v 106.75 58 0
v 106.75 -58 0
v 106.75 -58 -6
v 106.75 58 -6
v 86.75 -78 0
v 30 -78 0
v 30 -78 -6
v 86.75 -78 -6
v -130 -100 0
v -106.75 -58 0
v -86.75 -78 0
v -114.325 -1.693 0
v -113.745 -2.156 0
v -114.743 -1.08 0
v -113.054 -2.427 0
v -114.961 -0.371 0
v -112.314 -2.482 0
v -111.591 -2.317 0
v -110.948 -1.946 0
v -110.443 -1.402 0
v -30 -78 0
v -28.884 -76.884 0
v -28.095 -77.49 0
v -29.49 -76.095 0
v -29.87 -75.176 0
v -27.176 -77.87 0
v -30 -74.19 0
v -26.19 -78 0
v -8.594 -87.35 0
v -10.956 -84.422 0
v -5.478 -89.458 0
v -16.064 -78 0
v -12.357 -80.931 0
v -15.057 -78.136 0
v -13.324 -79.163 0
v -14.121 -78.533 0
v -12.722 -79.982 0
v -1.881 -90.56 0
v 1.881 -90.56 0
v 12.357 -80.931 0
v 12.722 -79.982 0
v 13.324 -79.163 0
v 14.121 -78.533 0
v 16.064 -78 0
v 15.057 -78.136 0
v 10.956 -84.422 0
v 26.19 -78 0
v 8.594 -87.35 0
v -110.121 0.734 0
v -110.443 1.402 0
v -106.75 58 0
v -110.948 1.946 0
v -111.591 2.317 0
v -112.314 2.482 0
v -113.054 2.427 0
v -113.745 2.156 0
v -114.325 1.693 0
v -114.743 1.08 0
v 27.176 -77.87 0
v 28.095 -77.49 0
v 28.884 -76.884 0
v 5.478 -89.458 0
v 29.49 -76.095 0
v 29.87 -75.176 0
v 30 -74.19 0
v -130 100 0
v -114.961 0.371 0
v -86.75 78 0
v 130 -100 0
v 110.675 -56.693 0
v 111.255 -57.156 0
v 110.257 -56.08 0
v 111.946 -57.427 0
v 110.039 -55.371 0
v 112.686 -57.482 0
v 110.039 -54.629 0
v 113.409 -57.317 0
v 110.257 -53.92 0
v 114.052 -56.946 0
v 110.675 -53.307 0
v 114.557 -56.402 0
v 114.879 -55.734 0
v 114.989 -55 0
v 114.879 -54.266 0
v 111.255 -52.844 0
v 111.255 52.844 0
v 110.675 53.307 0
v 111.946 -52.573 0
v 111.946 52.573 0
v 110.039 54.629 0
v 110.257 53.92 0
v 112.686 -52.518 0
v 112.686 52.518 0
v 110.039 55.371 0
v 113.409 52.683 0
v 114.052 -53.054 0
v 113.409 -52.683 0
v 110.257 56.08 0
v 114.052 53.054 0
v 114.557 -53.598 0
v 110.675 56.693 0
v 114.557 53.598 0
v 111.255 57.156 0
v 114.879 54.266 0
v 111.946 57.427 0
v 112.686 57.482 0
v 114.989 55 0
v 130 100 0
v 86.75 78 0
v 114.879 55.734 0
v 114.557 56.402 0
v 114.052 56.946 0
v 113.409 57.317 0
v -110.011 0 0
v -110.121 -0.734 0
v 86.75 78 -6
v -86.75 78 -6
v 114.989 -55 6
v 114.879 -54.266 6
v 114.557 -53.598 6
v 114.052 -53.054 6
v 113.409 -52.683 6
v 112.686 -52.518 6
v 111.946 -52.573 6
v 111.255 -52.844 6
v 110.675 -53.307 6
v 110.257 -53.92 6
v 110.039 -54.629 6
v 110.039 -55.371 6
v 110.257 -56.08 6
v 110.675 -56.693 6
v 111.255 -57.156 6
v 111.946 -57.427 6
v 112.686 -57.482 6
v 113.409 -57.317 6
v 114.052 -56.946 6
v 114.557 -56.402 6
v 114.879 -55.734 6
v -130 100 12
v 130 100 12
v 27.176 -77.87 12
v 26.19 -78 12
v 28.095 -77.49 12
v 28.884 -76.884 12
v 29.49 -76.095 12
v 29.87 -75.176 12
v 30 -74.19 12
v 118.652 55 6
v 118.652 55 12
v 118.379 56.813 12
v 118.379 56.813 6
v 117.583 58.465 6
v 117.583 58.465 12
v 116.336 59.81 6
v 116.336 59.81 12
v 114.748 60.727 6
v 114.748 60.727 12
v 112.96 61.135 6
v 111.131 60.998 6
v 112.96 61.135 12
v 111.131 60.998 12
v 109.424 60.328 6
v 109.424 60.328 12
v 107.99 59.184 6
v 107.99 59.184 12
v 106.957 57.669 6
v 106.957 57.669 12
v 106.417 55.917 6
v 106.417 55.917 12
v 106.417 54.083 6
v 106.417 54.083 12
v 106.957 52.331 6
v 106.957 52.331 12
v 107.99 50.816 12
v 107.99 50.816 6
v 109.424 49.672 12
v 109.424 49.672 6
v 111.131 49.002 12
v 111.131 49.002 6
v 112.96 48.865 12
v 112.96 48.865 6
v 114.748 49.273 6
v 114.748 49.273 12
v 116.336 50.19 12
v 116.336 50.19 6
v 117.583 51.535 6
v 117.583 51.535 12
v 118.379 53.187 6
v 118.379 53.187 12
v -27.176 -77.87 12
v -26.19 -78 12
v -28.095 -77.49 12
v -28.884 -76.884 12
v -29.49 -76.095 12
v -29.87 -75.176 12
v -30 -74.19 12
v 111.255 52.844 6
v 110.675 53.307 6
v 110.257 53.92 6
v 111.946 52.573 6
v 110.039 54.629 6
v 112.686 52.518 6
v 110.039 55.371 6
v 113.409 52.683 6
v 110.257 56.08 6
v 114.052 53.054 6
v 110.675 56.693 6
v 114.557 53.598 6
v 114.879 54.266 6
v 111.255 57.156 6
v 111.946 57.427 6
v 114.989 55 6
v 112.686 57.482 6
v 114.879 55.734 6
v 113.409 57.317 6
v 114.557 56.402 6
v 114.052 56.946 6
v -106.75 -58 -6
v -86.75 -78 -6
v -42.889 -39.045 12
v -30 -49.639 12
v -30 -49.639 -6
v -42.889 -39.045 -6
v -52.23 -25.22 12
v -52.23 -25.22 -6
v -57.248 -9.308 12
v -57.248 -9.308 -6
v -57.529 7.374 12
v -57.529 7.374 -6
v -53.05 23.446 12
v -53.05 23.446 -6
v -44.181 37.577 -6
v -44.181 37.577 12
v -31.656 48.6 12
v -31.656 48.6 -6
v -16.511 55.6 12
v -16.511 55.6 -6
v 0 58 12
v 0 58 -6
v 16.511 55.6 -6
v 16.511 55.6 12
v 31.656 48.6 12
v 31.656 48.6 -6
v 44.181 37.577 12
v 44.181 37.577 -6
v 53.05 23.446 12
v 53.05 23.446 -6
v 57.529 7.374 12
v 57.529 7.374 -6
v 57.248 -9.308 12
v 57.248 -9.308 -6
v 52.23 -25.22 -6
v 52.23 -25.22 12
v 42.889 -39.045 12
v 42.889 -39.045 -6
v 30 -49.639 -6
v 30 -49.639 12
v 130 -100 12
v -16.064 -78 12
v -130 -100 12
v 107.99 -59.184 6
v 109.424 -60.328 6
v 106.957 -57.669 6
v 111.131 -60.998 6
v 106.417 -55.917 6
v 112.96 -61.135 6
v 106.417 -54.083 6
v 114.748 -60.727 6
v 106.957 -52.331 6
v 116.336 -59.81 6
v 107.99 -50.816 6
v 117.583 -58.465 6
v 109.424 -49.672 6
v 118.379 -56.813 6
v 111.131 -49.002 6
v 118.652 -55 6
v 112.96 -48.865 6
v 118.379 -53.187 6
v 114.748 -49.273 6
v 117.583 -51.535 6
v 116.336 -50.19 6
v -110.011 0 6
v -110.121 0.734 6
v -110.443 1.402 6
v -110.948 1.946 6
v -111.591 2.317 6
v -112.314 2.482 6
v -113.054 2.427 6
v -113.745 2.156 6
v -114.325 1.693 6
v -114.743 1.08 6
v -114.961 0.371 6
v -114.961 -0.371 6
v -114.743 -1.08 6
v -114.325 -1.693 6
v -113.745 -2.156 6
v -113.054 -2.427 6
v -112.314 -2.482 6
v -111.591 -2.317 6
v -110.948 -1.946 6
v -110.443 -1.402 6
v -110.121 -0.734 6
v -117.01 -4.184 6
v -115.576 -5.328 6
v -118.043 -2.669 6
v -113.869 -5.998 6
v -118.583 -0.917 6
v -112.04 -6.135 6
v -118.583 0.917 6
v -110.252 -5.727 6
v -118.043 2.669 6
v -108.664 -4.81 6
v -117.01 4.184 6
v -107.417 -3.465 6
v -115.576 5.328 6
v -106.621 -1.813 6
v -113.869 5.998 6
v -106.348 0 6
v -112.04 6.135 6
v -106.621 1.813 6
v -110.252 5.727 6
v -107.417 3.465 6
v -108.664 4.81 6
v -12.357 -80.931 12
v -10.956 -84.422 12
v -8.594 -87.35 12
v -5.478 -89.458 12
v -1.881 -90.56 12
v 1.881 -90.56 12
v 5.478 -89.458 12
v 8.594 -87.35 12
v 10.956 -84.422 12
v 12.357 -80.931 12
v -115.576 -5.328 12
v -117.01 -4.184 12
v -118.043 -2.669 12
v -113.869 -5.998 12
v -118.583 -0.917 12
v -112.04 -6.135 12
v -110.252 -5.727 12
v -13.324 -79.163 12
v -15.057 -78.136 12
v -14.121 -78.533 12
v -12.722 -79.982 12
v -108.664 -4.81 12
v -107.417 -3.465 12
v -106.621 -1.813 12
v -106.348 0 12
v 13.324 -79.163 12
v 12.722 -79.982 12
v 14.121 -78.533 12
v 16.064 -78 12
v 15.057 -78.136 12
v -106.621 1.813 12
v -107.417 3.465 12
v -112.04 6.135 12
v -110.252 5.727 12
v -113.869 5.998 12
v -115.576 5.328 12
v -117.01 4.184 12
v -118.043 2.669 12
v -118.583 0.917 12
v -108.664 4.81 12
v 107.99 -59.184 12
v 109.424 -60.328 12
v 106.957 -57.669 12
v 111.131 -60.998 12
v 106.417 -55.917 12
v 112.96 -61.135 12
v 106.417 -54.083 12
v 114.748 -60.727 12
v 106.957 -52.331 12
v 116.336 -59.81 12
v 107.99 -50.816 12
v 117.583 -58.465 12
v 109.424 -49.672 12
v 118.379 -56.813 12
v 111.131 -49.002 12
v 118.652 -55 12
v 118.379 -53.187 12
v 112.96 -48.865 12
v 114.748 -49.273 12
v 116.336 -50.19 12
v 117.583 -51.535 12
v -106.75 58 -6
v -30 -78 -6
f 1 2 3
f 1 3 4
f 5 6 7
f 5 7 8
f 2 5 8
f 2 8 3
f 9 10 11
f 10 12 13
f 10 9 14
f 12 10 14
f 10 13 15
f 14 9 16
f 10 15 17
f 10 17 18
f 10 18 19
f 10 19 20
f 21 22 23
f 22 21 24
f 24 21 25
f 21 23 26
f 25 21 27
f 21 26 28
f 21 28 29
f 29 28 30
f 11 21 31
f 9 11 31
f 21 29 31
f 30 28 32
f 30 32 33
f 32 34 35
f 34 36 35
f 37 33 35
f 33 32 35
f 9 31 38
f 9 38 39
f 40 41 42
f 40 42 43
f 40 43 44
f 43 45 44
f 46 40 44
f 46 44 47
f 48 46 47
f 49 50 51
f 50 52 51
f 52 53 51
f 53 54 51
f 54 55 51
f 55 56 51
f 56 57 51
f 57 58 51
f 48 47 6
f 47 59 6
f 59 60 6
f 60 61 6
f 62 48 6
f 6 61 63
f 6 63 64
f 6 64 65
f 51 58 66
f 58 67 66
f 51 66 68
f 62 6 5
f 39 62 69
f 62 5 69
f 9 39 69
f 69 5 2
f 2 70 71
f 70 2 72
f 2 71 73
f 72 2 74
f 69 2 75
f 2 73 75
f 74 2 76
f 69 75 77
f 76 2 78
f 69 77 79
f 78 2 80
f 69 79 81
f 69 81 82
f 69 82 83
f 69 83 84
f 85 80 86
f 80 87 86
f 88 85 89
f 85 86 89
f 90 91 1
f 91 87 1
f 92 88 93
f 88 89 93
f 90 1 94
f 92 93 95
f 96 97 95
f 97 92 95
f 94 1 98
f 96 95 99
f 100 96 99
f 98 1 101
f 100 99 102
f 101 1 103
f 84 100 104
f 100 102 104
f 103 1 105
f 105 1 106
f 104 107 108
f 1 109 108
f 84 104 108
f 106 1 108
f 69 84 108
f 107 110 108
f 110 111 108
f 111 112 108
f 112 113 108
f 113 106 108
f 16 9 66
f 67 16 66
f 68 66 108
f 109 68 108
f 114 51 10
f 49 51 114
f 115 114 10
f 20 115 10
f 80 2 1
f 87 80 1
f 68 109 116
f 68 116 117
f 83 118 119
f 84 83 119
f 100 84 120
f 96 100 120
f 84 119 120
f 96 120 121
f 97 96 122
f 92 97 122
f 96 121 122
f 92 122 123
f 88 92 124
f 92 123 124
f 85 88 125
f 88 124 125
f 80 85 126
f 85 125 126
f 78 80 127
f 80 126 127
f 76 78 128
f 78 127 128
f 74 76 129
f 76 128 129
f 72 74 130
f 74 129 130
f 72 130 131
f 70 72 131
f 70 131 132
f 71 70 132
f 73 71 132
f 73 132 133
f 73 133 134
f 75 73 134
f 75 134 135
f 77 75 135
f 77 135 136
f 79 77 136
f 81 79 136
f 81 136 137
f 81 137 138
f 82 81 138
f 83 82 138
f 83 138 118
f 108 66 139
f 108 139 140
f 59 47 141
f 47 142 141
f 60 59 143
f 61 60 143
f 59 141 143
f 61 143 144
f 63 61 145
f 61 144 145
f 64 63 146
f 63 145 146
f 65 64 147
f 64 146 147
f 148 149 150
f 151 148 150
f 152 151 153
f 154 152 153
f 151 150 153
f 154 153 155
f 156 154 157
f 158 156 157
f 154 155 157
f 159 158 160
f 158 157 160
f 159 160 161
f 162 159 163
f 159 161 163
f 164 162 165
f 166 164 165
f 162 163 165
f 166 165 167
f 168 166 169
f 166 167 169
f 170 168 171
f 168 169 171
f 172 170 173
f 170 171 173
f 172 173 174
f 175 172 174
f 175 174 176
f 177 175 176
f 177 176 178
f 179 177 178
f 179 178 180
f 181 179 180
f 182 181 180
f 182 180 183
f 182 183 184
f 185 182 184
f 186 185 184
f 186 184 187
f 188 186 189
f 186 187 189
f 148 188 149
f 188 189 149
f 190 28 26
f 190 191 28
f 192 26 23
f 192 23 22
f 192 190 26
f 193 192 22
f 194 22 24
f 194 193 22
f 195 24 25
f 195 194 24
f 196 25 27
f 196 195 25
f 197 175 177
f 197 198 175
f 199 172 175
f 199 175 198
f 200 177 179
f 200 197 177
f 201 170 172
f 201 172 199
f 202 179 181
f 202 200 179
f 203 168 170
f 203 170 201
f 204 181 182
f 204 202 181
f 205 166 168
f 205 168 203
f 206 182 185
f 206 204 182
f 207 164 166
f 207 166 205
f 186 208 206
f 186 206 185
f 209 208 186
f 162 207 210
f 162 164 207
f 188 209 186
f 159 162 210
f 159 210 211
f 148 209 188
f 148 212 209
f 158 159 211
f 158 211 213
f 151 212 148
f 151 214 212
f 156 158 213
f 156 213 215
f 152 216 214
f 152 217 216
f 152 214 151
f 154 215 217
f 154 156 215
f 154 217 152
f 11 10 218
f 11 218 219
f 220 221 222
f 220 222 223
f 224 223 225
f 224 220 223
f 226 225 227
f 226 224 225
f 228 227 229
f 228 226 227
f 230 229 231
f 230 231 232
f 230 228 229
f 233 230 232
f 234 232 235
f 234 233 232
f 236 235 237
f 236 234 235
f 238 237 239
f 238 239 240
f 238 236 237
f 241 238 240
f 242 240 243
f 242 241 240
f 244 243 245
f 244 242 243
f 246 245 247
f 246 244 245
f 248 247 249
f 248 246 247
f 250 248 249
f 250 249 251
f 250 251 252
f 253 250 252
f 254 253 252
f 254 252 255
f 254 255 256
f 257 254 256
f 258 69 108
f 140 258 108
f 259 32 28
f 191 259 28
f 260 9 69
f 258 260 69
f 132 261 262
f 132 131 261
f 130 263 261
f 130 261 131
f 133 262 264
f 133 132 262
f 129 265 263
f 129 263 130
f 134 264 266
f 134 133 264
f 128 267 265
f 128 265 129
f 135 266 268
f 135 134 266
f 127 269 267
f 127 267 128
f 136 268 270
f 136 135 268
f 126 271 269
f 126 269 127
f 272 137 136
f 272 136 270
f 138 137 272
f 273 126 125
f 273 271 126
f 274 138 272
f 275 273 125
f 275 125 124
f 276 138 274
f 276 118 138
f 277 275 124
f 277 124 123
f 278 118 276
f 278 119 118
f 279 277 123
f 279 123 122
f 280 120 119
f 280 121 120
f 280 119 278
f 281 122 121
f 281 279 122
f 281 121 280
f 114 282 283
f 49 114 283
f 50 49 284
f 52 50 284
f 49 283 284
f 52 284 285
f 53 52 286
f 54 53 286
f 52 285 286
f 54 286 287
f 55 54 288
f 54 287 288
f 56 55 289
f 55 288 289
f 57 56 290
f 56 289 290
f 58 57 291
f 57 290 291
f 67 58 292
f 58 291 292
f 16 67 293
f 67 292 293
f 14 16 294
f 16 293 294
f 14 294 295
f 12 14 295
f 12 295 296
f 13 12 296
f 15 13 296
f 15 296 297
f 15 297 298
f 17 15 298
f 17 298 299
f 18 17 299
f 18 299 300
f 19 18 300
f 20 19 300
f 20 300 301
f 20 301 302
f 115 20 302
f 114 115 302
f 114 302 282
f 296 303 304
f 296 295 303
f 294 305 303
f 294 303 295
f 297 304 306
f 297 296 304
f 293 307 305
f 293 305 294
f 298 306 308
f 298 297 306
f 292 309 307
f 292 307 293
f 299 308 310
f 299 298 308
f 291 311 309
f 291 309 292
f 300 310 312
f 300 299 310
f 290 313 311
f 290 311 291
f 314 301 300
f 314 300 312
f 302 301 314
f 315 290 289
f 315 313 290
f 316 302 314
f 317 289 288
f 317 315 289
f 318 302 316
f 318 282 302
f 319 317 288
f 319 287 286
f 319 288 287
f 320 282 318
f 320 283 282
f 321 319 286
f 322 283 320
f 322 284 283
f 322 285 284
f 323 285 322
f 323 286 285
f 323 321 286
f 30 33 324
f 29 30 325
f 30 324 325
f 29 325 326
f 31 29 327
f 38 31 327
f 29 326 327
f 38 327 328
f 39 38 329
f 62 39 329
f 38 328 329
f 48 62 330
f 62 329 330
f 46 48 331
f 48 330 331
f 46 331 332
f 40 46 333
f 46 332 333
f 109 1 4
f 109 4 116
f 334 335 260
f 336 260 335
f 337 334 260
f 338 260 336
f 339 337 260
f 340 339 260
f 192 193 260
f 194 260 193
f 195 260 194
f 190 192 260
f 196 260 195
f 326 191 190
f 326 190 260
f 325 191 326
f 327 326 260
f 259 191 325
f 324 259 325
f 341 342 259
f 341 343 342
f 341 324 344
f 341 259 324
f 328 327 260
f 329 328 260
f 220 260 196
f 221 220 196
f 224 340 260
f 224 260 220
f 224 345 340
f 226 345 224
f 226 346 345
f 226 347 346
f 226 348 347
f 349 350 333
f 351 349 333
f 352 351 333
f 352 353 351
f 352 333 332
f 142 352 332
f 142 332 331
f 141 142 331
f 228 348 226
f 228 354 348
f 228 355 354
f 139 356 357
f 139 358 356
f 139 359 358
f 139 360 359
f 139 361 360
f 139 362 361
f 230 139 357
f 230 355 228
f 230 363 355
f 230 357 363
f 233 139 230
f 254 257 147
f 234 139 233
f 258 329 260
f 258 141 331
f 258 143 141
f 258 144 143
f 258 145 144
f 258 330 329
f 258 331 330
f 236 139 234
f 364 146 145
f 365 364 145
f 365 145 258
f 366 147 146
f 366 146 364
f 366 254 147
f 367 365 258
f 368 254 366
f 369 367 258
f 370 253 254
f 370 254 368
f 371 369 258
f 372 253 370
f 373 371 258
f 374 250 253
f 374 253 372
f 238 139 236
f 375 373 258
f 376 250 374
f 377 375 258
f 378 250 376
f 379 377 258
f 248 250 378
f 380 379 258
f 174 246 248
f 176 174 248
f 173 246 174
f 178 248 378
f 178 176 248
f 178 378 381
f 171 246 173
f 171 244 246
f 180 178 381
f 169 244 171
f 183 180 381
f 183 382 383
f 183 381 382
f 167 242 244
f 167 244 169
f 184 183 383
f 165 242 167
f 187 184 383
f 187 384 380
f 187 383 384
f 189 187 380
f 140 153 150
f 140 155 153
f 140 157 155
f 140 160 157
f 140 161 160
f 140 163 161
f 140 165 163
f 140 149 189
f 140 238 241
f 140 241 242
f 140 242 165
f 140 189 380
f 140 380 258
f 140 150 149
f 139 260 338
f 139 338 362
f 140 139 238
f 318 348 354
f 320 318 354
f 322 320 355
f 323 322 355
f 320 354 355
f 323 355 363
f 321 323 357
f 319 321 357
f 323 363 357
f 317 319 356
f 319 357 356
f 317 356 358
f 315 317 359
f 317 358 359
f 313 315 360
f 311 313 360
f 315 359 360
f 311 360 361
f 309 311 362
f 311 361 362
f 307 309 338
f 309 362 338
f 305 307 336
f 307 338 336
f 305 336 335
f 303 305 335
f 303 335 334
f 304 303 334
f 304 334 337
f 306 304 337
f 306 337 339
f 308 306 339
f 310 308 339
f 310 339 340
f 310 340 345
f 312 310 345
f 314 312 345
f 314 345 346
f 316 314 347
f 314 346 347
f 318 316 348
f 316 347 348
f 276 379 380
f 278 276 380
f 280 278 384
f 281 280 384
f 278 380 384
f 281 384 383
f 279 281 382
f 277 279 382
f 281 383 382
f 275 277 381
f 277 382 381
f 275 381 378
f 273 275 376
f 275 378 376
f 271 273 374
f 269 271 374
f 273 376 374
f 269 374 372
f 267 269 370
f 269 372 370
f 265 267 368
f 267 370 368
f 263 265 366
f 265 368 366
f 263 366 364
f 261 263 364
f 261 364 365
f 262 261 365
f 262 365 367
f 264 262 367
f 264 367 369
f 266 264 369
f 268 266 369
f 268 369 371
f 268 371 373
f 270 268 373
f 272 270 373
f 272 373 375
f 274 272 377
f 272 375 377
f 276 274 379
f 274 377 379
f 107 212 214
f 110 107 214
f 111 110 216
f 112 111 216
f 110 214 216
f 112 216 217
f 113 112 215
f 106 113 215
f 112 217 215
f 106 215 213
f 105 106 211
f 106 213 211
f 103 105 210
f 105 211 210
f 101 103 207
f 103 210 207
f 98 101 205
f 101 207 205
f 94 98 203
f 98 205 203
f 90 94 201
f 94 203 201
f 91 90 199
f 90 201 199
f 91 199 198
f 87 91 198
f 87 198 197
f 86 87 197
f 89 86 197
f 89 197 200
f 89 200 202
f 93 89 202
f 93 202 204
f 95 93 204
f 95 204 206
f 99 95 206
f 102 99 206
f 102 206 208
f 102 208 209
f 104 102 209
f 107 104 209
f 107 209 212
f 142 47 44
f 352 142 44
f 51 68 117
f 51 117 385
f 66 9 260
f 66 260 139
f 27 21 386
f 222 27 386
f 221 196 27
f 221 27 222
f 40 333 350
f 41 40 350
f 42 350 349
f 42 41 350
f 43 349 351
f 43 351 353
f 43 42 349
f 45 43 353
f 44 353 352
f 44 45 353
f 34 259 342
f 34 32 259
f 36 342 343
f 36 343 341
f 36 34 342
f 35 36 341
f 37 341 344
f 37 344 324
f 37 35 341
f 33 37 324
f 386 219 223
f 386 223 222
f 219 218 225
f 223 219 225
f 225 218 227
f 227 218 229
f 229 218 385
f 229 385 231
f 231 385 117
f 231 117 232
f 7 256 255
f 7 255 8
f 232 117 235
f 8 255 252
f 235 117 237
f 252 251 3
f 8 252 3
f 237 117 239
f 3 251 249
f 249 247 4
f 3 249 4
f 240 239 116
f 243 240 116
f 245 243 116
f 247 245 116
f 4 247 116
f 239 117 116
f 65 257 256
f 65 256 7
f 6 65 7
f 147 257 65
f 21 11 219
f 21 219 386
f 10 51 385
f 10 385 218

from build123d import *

# Parameters (mm, degrees)
F0_W     = 260
F0_H     = 200
F1_DEPTH = 12
F2_DEPTH = 6
F3_R     = 6.15188
F3_R_2   = 2.4892
F4_DEPTH = 6
F5_DEPTH = 18.001
F6_R     = 3.81
F8_DEPTH = 18.001
F9_R     = 3.81


with BuildPart() as f1:
    # F0 (on Top) → F1 (new body)
    with BuildSketch(Plane.XY):
        Rectangle(F0_W, F0_H)
        Polygon((-86.75, 78), (86.75, 78), (106.75, 58), (106.75, -58), (86.75, -78), (30, -78), (-30, -78), (-86.75, -78), (-106.75, -58), (-106.75, 58), align=None, mode=Mode.SUBTRACT)
        with BuildLine():
            Line((106.75, 58), (86.75, 78))
            Line((86.75, 78), (-86.75, 78))
            Line((-86.75, 78), (-106.75, 58))
            Line((-106.75, 58), (-106.75, -58))
            Line((-106.75, -58), (-86.75, -78))
            Line((-86.75, -78), (-30, -78))
            Line((-30, -78), (-30, -49.638694584))
            ThreePointArc((-30, -49.638694584), (0, 58), (30, -49.638694584))
            Line((30, -49.638694584), (30, -78))
            Line((30, -78), (86.75, -78))
            Line((86.75, -78), (106.75, -58))
            Line((106.75, -58), (106.75, 58))
        make_face()
    extrude(amount=F1_DEPTH)

    # F0 (on Top) → F2 (join)
    with BuildSketch(Plane.XY):
        with BuildLine():
            Line((106.75, 58), (86.75, 78))
            Line((86.75, 78), (-86.75, 78))
            Line((-86.75, 78), (-106.75, 58))
            Line((-106.75, 58), (-106.75, -58))
            Line((-106.75, -58), (-86.75, -78))
            Line((-86.75, -78), (-30, -78))
            Line((-30, -78), (-30, -49.638694584))
            ThreePointArc((-30, -49.638694584), (0, 58), (30, -49.638694584))
            Line((30, -49.638694584), (30, -78))
            Line((30, -78), (86.75, -78))
            Line((86.75, -78), (106.75, -58))
            Line((106.75, -58), (106.75, 58))
        make_face()
    extrude(amount=-F2_DEPTH)

    # F3 (on face) → F4 (cut)
    with BuildSketch(Plane.XY.offset(12)):
        with Locations((-112.5, 0)):
            Circle(F3_R)
        with Locations((-112.5, 0)):
            Circle(F3_R_2, mode=Mode.SUBTRACT)
        with Locations((112.5, 55)):
            Circle(F3_R)
        with Locations((112.5, 55)):
            Circle(F3_R_2, mode=Mode.SUBTRACT)
        with Locations((112.5, -55)):
            Circle(F3_R)
        with Locations((112.5, -55)):
            Circle(F3_R_2, mode=Mode.SUBTRACT)
        with Locations((-112.5, 0)):
            Circle(F3_R_2)
        with Locations((112.5, 55)):
            Circle(F3_R_2)
        with Locations((112.5, -55)):
            Circle(F3_R_2)
    extrude(amount=-F4_DEPTH, mode=Mode.SUBTRACT)

    # F3 (on face) → F5 (cut, through all)
    with BuildSketch(Plane.XY.offset(12)):
        with Locations((-112.5, 0)):
            Circle(F3_R_2)
        with Locations((112.5, 55)):
            Circle(F3_R_2)
        with Locations((112.5, -55)):
            Circle(F3_R_2)
    extrude(amount=-F5_DEPTH, mode=Mode.SUBTRACT)

    # F6
    f6_edges = [f1.edges().sort_by_distance(p)[0] for p in [
        (-30, -78, 6),
        (30, -78, 6),
    ]]
    fillet(f6_edges, radius=F6_R)

    # F7 (on face) → F8 (cut, through all)
    with BuildSketch(Plane.XY.offset(12)):
        with BuildLine():
            Line((12.7, -78), (-12.7, -78))
            ThreePointArc((-12.7, -78), (0, -90.7), (12.7, -78))
        make_face()
    extrude(amount=-F8_DEPTH, mode=Mode.SUBTRACT)

    # F9
    f9_edges = [f1.edges().sort_by_distance(p)[0] for p in [
        (-12.7, -78, 6),
        (12.7, -78, 6),
    ]]
    fillet(f9_edges, radius=F9_R)


solid = f1.part
